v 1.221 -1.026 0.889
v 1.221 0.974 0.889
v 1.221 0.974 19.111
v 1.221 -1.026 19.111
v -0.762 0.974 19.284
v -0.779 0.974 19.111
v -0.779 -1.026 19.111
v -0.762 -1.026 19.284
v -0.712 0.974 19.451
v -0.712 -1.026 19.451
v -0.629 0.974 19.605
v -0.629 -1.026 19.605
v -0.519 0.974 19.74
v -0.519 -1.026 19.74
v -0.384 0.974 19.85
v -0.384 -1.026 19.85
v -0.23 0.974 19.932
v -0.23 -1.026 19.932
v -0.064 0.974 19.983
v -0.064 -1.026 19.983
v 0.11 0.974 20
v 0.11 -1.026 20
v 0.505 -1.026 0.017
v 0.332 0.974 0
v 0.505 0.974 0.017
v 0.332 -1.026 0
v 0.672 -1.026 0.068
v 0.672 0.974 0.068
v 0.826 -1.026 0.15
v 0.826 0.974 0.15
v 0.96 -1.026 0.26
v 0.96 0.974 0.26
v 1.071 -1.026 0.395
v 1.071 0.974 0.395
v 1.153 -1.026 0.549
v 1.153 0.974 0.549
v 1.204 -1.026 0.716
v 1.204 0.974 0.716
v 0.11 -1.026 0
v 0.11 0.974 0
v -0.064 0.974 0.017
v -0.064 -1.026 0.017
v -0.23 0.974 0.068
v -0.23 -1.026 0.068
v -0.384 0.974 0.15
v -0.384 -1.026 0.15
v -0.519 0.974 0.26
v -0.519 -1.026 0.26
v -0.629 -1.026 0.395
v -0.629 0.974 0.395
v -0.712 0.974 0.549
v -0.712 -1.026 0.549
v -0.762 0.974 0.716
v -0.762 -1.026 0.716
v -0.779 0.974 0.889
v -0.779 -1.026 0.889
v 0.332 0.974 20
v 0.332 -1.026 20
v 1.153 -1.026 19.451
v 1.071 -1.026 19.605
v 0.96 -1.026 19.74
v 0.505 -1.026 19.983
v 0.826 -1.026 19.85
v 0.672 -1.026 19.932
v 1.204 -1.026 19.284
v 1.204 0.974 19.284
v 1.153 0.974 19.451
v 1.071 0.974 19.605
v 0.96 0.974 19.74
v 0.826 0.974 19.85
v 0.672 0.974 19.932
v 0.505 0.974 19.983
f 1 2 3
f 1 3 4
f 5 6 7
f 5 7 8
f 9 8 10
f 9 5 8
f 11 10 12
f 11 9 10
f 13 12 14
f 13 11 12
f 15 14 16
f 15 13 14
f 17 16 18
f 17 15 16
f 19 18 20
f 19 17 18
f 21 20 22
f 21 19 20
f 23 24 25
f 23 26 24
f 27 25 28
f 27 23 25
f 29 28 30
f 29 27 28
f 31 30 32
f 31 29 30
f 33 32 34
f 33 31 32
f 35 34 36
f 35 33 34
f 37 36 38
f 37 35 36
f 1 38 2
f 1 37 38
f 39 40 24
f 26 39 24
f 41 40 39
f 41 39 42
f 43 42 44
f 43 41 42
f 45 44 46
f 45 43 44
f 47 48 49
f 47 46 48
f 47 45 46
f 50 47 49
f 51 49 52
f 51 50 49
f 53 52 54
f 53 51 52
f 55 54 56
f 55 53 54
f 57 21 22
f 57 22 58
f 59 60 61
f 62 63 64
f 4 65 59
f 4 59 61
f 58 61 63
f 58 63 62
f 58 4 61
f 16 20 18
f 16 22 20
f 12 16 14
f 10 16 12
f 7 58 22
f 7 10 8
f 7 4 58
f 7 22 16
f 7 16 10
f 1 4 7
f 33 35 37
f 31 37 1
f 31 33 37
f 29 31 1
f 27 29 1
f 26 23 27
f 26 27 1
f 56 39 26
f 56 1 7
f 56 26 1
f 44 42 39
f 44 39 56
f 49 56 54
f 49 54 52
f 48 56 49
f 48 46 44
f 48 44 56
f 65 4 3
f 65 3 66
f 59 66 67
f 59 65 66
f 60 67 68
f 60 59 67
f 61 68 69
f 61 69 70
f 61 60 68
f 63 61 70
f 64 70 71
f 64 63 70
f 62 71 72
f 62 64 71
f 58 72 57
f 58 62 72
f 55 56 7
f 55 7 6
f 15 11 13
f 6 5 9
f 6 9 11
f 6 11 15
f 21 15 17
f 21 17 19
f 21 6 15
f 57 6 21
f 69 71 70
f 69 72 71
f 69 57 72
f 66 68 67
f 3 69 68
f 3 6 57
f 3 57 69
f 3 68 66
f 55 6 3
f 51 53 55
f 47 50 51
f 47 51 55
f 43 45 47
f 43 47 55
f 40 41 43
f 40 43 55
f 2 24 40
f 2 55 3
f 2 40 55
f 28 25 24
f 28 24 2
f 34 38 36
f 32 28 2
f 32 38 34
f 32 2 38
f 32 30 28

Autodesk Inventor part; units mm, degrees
ref_plane "YZ Plane" through (0, 0, 0) normal (1, 0, 0) x (0, 1, 0)
ref_plane "XZ Plane" through (0, 0, 0) normal (0, 1, 0) x (-1, 0, 0)
ref_plane "XY Plane" through (0, 0, 0) normal (0, 0, 1) x (1, 0, 0)
sketch "Sketch1" plane through (0, 0, 0) normal (0, 0, 1) x (1, 0, 0)
  line L0 (-0.7792, 0.974) -> (1.2208, 0.974)
  line L1 (1.2208, 0.974) -> (1.2208, -1.026)
  line L2 (1.2208, -1.026) -> (-0.7792, -1.026)
  line L3 (-0.7792, -1.026) -> (-0.7792, 0.974)
  point P0 (0, 0)
  dimension "d0" = 2
extrude "Extrusion1" add sketch "Sketch1" along normal blind 20
fillet "Fillet1" radius 0.889 4 edges at (-0.7792, -0.026, 20) (1.2208, -0.026, 20) (1.2208, -0.026, 0) (-0.7792, -0.026, 0)
properties part number "Maybe CIM Key"
